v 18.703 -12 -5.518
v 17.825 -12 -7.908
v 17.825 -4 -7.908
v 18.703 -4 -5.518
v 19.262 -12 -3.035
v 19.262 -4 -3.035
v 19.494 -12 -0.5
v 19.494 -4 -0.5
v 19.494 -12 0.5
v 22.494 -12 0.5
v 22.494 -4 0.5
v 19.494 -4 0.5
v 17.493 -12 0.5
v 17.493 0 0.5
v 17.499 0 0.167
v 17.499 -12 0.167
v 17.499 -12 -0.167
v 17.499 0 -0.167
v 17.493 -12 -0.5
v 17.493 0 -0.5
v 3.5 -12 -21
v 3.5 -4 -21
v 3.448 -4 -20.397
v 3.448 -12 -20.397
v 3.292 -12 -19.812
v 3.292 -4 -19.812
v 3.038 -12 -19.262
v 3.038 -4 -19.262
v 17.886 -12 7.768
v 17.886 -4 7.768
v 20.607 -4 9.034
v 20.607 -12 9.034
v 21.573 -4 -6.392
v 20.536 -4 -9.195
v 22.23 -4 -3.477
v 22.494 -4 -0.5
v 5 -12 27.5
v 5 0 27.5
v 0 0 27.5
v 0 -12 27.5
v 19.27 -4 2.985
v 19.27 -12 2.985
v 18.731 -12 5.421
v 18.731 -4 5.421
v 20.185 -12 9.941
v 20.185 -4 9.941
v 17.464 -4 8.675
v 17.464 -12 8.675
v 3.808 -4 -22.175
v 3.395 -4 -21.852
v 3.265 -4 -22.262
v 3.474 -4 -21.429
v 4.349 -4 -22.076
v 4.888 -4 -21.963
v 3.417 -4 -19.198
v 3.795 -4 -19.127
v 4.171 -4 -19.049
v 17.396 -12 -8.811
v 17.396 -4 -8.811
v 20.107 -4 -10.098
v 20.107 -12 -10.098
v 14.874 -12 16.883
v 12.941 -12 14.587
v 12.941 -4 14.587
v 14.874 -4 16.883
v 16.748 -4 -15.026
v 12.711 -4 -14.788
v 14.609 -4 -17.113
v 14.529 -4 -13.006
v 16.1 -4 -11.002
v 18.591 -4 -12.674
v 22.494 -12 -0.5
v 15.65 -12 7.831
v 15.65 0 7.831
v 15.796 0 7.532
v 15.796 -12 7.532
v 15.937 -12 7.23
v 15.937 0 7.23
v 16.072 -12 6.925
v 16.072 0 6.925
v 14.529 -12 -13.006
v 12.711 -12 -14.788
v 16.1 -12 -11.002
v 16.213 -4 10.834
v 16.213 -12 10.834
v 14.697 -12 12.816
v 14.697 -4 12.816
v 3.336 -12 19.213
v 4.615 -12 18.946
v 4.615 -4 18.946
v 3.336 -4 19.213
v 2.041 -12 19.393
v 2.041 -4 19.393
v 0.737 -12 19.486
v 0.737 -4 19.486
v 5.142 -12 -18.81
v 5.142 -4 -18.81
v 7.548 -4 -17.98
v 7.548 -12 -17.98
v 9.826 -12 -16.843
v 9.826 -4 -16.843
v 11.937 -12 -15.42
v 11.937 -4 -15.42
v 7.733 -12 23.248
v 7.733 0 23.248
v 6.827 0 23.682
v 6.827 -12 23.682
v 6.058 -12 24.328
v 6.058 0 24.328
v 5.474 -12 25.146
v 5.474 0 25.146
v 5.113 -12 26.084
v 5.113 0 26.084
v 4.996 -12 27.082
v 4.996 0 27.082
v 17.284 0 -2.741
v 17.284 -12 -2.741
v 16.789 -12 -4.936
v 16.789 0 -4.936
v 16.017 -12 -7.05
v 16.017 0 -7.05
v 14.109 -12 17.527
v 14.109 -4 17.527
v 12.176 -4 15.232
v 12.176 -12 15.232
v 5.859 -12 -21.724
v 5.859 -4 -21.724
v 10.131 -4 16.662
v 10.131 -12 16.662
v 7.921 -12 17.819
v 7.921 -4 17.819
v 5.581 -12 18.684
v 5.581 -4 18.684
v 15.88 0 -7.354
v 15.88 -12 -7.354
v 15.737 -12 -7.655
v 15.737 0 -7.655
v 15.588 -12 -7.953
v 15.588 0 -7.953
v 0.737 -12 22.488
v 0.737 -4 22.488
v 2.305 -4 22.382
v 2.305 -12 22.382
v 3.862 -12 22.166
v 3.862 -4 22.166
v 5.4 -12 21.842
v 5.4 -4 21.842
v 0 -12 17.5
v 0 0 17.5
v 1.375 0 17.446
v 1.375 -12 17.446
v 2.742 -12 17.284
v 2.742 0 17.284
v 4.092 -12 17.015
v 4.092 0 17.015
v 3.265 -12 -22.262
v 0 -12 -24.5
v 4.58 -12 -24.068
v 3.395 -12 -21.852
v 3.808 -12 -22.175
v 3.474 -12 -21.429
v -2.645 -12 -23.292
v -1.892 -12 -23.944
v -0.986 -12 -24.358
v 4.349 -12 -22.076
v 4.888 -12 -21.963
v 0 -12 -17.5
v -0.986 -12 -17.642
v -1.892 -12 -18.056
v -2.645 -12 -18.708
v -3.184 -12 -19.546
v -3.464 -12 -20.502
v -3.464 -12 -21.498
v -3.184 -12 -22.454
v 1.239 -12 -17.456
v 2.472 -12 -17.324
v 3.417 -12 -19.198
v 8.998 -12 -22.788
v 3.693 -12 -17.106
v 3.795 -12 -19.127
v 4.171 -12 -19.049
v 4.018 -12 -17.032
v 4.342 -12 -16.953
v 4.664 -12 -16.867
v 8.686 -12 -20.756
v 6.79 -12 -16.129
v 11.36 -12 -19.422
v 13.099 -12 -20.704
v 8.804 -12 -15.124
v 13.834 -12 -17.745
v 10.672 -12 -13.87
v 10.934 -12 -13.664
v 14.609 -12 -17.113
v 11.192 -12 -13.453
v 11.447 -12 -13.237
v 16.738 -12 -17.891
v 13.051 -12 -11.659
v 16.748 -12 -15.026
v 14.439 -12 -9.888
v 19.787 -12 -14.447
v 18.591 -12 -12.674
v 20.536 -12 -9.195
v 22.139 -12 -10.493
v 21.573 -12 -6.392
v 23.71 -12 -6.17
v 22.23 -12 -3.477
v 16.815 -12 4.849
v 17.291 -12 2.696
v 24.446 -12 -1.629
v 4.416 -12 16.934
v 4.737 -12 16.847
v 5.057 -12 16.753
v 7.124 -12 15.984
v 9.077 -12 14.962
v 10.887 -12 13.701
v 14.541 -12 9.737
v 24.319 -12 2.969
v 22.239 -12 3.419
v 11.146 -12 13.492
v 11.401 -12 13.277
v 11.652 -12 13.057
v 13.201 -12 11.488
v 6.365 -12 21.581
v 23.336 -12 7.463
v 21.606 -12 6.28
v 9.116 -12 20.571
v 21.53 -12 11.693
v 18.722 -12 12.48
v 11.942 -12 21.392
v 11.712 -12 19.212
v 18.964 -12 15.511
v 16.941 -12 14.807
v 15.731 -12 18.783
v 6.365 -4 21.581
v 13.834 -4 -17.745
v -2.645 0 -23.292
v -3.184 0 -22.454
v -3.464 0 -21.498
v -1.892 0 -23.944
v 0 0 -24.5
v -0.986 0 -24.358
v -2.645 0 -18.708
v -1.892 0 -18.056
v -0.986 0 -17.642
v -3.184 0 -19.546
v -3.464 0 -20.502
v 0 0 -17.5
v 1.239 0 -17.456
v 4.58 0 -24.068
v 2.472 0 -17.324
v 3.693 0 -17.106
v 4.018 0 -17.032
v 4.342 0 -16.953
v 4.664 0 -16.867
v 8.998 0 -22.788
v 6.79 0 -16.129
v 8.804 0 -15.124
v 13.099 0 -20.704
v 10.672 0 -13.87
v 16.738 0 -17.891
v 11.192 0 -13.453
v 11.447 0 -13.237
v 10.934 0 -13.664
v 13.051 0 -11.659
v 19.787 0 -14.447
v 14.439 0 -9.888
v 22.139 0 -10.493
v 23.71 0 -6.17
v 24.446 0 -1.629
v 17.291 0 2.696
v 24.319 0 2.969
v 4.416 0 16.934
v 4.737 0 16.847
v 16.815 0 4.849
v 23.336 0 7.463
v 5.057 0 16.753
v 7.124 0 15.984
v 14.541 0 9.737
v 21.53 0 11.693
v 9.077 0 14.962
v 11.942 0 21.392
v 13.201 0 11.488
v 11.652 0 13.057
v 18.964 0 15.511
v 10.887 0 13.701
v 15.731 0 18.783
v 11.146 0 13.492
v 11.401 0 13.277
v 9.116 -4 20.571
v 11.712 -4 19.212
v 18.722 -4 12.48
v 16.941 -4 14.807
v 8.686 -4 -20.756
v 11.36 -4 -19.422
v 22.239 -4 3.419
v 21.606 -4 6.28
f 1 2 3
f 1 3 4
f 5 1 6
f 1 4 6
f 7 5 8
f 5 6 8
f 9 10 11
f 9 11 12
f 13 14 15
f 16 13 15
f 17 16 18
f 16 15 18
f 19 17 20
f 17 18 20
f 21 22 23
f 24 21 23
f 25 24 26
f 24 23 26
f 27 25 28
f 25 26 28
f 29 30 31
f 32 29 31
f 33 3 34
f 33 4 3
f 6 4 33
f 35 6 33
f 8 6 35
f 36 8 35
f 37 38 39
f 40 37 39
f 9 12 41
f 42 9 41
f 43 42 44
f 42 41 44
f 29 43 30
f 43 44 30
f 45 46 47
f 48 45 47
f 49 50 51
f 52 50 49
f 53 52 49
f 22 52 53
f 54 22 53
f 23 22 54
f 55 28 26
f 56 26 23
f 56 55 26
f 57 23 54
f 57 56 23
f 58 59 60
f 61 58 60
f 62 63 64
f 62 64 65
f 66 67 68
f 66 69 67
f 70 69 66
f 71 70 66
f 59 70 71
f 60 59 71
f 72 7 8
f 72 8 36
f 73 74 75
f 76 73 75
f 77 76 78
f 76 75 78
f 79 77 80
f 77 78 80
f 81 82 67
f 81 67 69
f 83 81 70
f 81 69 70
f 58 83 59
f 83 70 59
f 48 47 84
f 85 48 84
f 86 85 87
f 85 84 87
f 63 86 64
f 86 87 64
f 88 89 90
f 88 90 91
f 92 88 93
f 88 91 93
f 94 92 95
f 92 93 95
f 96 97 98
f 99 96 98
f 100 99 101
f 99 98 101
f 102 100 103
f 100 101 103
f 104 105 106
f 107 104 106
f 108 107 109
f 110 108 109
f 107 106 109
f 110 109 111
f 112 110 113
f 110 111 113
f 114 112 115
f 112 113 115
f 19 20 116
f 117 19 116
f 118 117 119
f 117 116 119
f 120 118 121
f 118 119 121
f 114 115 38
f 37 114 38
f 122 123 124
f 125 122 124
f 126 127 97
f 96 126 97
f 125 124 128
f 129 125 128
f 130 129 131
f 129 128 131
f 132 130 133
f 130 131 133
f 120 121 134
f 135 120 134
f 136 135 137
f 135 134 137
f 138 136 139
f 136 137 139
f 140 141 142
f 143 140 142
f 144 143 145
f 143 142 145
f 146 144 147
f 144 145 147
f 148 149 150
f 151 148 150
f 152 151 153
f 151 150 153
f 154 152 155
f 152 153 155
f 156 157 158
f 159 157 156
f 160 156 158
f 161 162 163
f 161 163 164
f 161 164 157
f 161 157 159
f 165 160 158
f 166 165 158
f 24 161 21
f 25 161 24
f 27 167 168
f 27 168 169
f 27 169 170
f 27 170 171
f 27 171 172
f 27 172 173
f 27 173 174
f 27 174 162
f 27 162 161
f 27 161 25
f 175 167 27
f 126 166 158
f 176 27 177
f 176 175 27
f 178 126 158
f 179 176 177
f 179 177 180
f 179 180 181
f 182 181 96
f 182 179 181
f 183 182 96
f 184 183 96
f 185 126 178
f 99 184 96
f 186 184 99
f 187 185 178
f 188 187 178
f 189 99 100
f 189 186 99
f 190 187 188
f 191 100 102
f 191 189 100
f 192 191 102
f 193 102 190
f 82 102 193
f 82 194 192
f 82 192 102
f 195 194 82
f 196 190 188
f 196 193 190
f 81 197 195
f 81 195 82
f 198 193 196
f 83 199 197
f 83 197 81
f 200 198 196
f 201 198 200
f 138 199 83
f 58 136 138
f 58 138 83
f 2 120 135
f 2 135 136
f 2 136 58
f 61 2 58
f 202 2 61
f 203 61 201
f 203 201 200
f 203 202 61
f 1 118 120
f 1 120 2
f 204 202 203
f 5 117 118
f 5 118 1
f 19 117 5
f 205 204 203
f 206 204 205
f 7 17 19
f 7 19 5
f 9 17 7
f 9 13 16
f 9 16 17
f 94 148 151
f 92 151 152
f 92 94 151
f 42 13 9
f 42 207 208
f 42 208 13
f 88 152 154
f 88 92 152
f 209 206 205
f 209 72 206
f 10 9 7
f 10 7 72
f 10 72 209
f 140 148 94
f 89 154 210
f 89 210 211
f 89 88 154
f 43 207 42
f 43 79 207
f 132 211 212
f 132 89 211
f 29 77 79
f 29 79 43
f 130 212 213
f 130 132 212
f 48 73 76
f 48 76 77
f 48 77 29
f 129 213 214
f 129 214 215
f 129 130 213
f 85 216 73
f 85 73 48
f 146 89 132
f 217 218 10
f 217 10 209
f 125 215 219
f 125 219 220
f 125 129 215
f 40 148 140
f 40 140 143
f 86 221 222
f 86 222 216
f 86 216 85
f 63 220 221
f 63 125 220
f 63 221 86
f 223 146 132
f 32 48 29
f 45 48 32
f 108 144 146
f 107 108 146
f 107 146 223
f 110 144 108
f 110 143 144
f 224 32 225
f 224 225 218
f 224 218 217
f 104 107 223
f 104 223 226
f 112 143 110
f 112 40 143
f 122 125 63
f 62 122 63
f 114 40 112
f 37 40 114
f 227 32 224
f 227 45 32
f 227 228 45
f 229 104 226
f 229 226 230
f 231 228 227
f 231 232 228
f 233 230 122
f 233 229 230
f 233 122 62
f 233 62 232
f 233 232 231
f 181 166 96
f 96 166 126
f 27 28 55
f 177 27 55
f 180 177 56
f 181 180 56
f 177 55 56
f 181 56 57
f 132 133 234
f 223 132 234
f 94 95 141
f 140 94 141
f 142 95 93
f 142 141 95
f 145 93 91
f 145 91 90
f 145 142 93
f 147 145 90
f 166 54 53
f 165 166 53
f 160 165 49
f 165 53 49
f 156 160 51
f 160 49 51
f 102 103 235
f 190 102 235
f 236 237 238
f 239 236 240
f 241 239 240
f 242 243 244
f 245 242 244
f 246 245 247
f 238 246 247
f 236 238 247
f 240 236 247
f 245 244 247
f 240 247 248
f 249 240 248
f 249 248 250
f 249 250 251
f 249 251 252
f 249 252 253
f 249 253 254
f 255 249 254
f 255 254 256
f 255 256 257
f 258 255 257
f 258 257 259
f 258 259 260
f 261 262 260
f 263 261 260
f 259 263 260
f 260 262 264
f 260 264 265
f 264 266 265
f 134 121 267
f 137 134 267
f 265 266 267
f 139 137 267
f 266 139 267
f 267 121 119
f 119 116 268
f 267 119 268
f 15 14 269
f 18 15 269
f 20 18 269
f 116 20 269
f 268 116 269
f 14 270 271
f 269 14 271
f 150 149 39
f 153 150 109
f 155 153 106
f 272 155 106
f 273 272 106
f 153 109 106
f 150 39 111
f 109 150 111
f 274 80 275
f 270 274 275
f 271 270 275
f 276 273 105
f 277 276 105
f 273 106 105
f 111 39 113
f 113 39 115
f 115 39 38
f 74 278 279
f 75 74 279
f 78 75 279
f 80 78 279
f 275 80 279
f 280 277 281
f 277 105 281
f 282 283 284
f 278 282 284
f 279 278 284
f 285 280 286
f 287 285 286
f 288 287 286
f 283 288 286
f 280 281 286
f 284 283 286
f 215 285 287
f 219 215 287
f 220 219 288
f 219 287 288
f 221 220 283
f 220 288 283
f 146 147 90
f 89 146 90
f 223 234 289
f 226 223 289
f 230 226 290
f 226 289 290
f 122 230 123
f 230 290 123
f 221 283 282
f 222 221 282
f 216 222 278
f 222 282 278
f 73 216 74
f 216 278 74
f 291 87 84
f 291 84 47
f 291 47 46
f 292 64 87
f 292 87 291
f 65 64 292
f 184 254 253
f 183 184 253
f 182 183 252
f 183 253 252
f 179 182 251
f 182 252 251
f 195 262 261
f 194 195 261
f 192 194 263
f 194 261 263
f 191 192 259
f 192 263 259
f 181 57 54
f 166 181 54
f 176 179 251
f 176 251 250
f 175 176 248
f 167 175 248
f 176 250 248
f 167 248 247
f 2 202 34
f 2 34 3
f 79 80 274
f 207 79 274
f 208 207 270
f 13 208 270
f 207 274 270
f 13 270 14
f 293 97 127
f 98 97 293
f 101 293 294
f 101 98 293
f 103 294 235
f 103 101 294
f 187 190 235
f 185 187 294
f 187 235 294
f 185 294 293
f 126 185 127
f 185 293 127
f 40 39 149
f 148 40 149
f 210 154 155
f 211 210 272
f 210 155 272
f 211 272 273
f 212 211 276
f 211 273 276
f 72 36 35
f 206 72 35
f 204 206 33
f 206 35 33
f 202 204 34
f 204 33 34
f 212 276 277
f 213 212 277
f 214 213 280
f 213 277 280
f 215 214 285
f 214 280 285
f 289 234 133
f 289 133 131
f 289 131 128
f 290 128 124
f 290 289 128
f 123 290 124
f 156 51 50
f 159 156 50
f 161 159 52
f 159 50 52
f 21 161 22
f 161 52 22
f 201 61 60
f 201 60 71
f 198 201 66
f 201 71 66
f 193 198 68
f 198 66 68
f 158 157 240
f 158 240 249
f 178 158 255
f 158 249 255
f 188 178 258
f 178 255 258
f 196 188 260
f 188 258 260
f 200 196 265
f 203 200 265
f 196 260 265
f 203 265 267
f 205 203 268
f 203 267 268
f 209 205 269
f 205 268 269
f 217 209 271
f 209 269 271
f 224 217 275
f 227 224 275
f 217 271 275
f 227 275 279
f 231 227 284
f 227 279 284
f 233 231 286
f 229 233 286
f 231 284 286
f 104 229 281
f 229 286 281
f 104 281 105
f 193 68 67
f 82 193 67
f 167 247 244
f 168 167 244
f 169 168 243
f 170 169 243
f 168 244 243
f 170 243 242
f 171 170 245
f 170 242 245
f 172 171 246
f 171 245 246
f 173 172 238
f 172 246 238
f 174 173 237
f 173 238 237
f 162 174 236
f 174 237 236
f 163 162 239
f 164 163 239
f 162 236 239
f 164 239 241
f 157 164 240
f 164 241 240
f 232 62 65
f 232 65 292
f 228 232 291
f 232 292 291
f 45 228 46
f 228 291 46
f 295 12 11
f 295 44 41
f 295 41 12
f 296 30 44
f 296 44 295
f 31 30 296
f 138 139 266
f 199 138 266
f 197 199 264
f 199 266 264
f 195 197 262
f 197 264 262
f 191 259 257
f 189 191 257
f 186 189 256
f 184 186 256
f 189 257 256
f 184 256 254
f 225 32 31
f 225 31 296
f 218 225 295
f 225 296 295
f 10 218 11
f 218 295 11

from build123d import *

# Parameters (mm, degrees)
F1_DEPTH = 12
F2_DEPTH = 4


with BuildPart() as f1:
    # F0 (on Front) → F1 (new body)
    with BuildSketch(Plane.XZ):
        with BuildLine():
            ThreePointArc((3.2645974288, -22.2619047619), (1.9790570145, -23.8867513459), (0, -24.5))
            ThreePointArc((0, -24.5), (24.1848553106, -3.91698527), (7.7332017966, 23.2475286853))
            ThreePointArc((7.7332017966, 23.2475286853), (5.7402372634, 24.7189229124), (4.9959526272, 27.0817493941))
            Line((4.9959526272, 27.0817493941), (5, 27.5))
            Line((5, 27.5), (0, 27.5))
            Line((0, 27.5), (0, 22.5))
            ThreePointArc((0, 22.5), (0.3684190635, 22.4969835177), (0.7367393421, 22.4879348794))
            ThreePointArc((0.7367393421, 22.4879348794), (3.0854175192, 22.2874448677), (5.4002308519, 21.8423329053))
            ThreePointArc((5.4002308519, 21.8423329053), (5.8842824725, 21.7169339407), (6.3654279159, 21.5808092399))
            ThreePointArc((6.3654279159, 21.5808092399), (10.4359015463, 19.9334382111), (14.1088814913, 17.5268212481))
            Line((14.1088814913, 17.5268212481), (15.390053392, 19.0478849319))
            Line((15.390053392, 19.0478849319), (16.1548961655, 18.4036679406))
            Line((16.1548961655, 18.4036679406), (14.8737242648, 16.8826042569))
            ThreePointArc((14.8737242648, 16.8826042569), (17.8696160512, 13.6721184234), (20.1848709505, 9.940874444))
            Line((20.1848709505, 9.940874444), (21.9880539238, 10.7796636511))
            Line((21.9880539238, 10.7796636511), (22.4098257867, 9.8729616628))
            Line((22.4098257867, 9.8729616628), (20.6066428134, 9.0341724557))
            ThreePointArc((20.6066428134, 9.0341724557), (21.968931262, 4.8596357071), (22.4944437584, 0.5))
            Line((22.4944437584, 0.5), (24.4831710321, 0.5))
            Line((24.4831710321, 0.5), (24.4831710321, -0.5))
            Line((24.4831710321, -0.5), (22.4944437584, -0.5))
            ThreePointArc((22.4944437584, -0.5), (21.9498115027, -4.9452780503), (20.5355495573, -9.1946291051))
            Line((20.5355495573, -9.1946291051), (22.3321351352, -10.0474575933))
            Line((22.3321351352, -10.0474575933), (21.9033038423, -10.9508421859))
            Line((21.9033038423, -10.9508421859), (20.1067182643, -10.0980136977))
            ThreePointArc((20.1067182643, -10.0980136977), (17.708431542, -13.8802540438), (14.6085543834, -17.1125725368))
            Line((14.6085543834, -17.1125725368), (15.8658425706, -18.6534367694))
            Line((15.8658425706, -18.6534367694), (15.0910434049, -19.2856442137))
            Line((15.0910434049, -19.2856442137), (13.8337552177, -17.7447799811))
            ThreePointArc((13.8337552177, -17.7447799811), (10.0452369261, -20.1331372393), (5.8587363435, -21.7238396343))
            Line((5.8587363435, -21.7238396343), (6.3337803191, -23.6549971603))
            Line((6.3337803191, -23.6549971603), (5.3627283546, -23.8938654968))
            Line((5.3627283546, -23.8938654968), (4.887684379, -21.9627079708))
            ThreePointArc((4.887684379, -21.9627079708), (4.0788851845, -22.1271935783), (3.2645974288, -22.2619047619))
        make_face()
        with BuildLine():
            Line((15.390053392, 19.0478849319), (14.1088814913, 17.5268212481))
            ThreePointArc((14.1088814913, 17.5268212481), (14.4948823033, 17.2089624038), (14.8737242648, 16.8826042569))
            Line((14.8737242648, 16.8826042569), (16.1548961655, 18.4036679406))
            Line((16.1548961655, 18.4036679406), (15.390053392, 19.0478849319))
        make_face()
        with BuildLine():
            Line((21.9880539238, 10.7796636511), (20.1848709505, 9.940874444))
            ThreePointArc((20.1848709505, 9.940874444), (20.4007947373, 9.4898669162), (20.6066428134, 9.0341724557))
            Line((20.6066428134, 9.0341724557), (22.4098257867, 9.8729616628))
            Line((22.4098257867, 9.8729616628), (21.9880539238, 10.7796636511))
        make_face()
        with BuildLine():
            ThreePointArc((22.4944437584, 0.5), (22.5, 0), (22.4944437584, -0.5))
            Line((22.4944437584, -0.5), (24.4831710321, -0.5))
            Line((24.4831710321, -0.5), (24.4831710321, 0.5))
            Line((24.4831710321, 0.5), (22.4944437584, 0.5))
        make_face()
        with BuildLine():
            ThreePointArc((20.5355495573, -9.1946291051), (20.3261533338, -9.6487040917), (20.1067182643, -10.0980136977))
            Line((20.1067182643, -10.0980136977), (21.9033038423, -10.9508421859))
            Line((21.9033038423, -10.9508421859), (22.3321351352, -10.0474575933))
            Line((22.3321351352, -10.0474575933), (20.5355495573, -9.1946291051))
        make_face()
        with BuildLine():
            ThreePointArc((14.6085543834, -17.1125725368), (14.2246674978, -17.4329812303), (13.8337552177, -17.7447799811))
            Line((13.8337552177, -17.7447799811), (15.0910434049, -19.2856442137))
            Line((15.0910434049, -19.2856442137), (15.8658425706, -18.6534367694))
            Line((15.8658425706, -18.6534367694), (14.6085543834, -17.1125725368))
        make_face()
        with BuildLine():
            ThreePointArc((5.8587363435, -21.7238396343), (5.3745375714, -21.8486692019), (4.887684379, -21.9627079708))
            Line((4.887684379, -21.9627079708), (5.3627283546, -23.8938654968))
            Line((5.3627283546, -23.8938654968), (6.3337803191, -23.6549971603))
            Line((6.3337803191, -23.6549971603), (5.8587363435, -21.7238396343))
        make_face()
        with BuildLine():
            ThreePointArc((10.6717140038, -13.8695537139), (7.8129620537, -15.6591067417), (4.6640153204, -16.8670377094))
            Line((4.6640153204, -16.8670377094), (5.1419270851, -18.8098534245))
            ThreePointArc((5.1419270851, -18.8098534245), (8.7058720027, -17.4487189408), (11.9365923038, -15.4197199772))
            Line((11.9365923038, -15.4197199772), (10.6717140038, -13.8695537139))
        make_face()
        with BuildLine():
            ThreePointArc((4.6640153204, -16.8670377094), (4.1801958889, -16.9934093792), (3.6929633559, -17.1059060459))
            Line((3.6929633559, -17.1059060459), (4.1708751206, -19.048721761))
            ThreePointArc((4.1708751206, -19.048721761), (4.6579325619, -18.9355133083), (5.1419270851, -18.8098534245))
            Line((5.1419270851, -18.8098534245), (4.6640153204, -16.8670377094))
        make_face()
        with BuildLine():
            ThreePointArc((3.6929633559, -17.1059060459), (1.8569658312, -17.4011975996), (0, -17.5))
            ThreePointArc((0, -17.5), (1.7559422921, -17.9723496459), (3.03793103, -19.2619047619))
            ThreePointArc((3.03793103, -19.2619047619), (3.6059788237, -19.1636874511), (4.1708751206, -19.048721761))
            Line((4.1708751206, -19.048721761), (3.6929633559, -17.1059060459))
        make_face()
        with BuildLine():
            ThreePointArc((0, -17.5), (-3.5, -21), (0, -24.5))
            ThreePointArc((0, -24.5), (1.9790570145, -23.8867513459), (3.2645974288, -22.2619047619))
            ThreePointArc((3.2645974288, -22.2619047619), (3.4406460876, -21.641836817), (3.5, -21))
            ThreePointArc((3.5, -21), (3.3825107986, -20.1007666057), (3.03793103, -19.2619047619))
            ThreePointArc((3.03793103, -19.2619047619), (1.7559422921, -17.9723496459), (0, -17.5))
        make_face()
        with BuildLine():
            ThreePointArc((11.4465131696, -13.2373462695), (11.0636302761, -13.5589854013), (10.6717140038, -13.8695537139))
            Line((10.6717140038, -13.8695537139), (11.9365923038, -15.4197199772))
            ThreePointArc((11.9365923038, -15.4197199772), (12.3280451648, -15.1085837329), (12.7113914695, -14.7875125328))
            Line((12.7113914695, -14.7875125328), (11.4465131696, -13.2373462695))
        make_face()
        with BuildLine():
            Line((4.1708751206, -19.048721761), (4.887684379, -21.9627079708))
            ThreePointArc((4.887684379, -21.9627079708), (5.3745375714, -21.8486692019), (5.8587363435, -21.7238396343))
            Line((5.8587363435, -21.7238396343), (5.1419270851, -18.8098534245))
            ThreePointArc((5.1419270851, -18.8098534245), (4.6579325619, -18.9355133083), (4.1708751206, -19.048721761))
        make_face()
        with BuildLine():
            Line((11.9365923038, -15.4197199772), (13.8337552177, -17.7447799811))
            ThreePointArc((13.8337552177, -17.7447799811), (14.2246674978, -17.4329812303), (14.6085543834, -17.1125725368))
            Line((14.6085543834, -17.1125725368), (12.7113914695, -14.7875125328))
            ThreePointArc((12.7113914695, -14.7875125328), (12.3280451648, -15.1085837329), (11.9365923038, -15.4197199772))
        make_face()
        with BuildLine():
            ThreePointArc((15.5883606598, -7.9531762171), (13.7732245327, -10.7957531452), (11.4465131696, -13.2373462695))
            Line((11.4465131696, -13.2373462695), (12.7113914695, -14.7875125328))
            ThreePointArc((12.7113914695, -14.7875125328), (15.3473073364, -12.0295535047), (17.3957920305, -8.8111531386))
            Line((17.3957920305, -8.8111531386), (15.5883606598, -7.9531762171))
        make_face()
        with BuildLine():
            ThreePointArc((16.0171919527, -7.0497916245), (15.8092303708, -7.5045476269), (15.5883606598, -7.9531762171))
            Line((15.5883606598, -7.9531762171), (17.3957920305, -8.8111531386))
            ThreePointArc((17.3957920305, -8.8111531386), (17.615999556, -8.3622102128), (17.8246233235, -7.907768546))
            Line((17.8246233235, -7.907768546), (16.0171919527, -7.0497916245))
        make_face()
        with BuildLine():
            ThreePointArc((17.4928556845, -0.5), (17.0720756132, -3.8463273724), (16.0171919527, -7.0497916245))
            Line((16.0171919527, -7.0497916245), (17.8246233235, -7.907768546))
            ThreePointArc((17.8246233235, -7.907768546), (19.023169969, -4.2859076436), (19.4935886896, -0.5))
            Line((19.4935886896, -0.5), (17.4928556845, -0.5))
        make_face()
        with BuildLine():
            ThreePointArc((17.4928556845, 0.5), (17.5, 0), (17.4928556845, -0.5))
            Line((17.4928556845, -0.5), (19.4935886896, -0.5))
            ThreePointArc((19.4935886896, -0.5), (19.5, 0), (19.4935886896, 0.5))
            Line((19.4935886896, 0.5), (17.4928556845, 0.5))
        make_face()
        with BuildLine():
            ThreePointArc((16.0716929621, 6.9246433361), (17.0869465371, 3.7797166611), (17.4928556845, 0.5))
            Line((17.4928556845, 0.5), (19.4935886896, 0.5))
            ThreePointArc((19.4935886896, 0.5), (19.0397404271, 4.2116842795), (17.8857615559, 7.7684962229))
            Line((17.8857615559, 7.7684962229), (16.0716929621, 6.9246433361))
        make_face()
        with BuildLine():
            Line((17.3957920305, -8.8111531386), (20.1067182643, -10.0980136977))
            ThreePointArc((20.1067182643, -10.0980136977), (20.3261533338, -9.6487040917), (20.5355495573, -9.1946291051))
            Line((20.5355495573, -9.1946291051), (17.8246233235, -7.907768546))
            ThreePointArc((17.8246233235, -7.907768546), (17.615999556, -8.3622102128), (17.3957920305, -8.8111531386))
        make_face()
        with BuildLine():
            Line((19.4935886896, -0.5), (22.4944437584, -0.5))
            ThreePointArc((22.4944437584, -0.5), (22.5, 0), (22.4944437584, 0.5))
            Line((22.4944437584, 0.5), (19.4935886896, 0.5))
            ThreePointArc((19.4935886896, 0.5), (19.5, 0), (19.4935886896, -0.5))
        make_face()
        with BuildLine():
            Line((17.463989693, 8.6751982112), (15.6499210991, 7.8313453244))
            ThreePointArc((15.6499210991, 7.8313453244), (15.8672847957, 7.3810076015), (16.0716929621, 6.9246433361))
            Line((16.0716929621, 6.9246433361), (17.8857615559, 7.7684962229))
            ThreePointArc((17.8857615559, 7.7684962229), (17.6806887723, 8.2245513274), (17.463989693, 8.6751982112))
        make_face()
        with BuildLine():
            Line((20.1848709505, 9.940874444), (17.463989693, 8.6751982112))
            ThreePointArc((17.463989693, 8.6751982112), (17.6806887723, 8.2245513274), (17.8857615559, 7.7684962229))
            Line((17.8857615559, 7.7684962229), (20.6066428134, 9.0341724557))
            ThreePointArc((20.6066428134, 9.0341724557), (20.4007947373, 9.4898669162), (20.1848709505, 9.940874444))
        make_face()
        with BuildLine():
            Line((12.9405224412, 14.5874219432), (11.6516162443, 13.0571757626))
            ThreePointArc((11.6516162443, 13.0571757626), (13.898590262, 10.6338698849), (15.6499210991, 7.8313453244))
            Line((15.6499210991, 7.8313453244), (17.463989693, 8.6751982112))
            ThreePointArc((17.463989693, 8.6751982112), (15.4870005777, 11.8491693003), (12.9405224412, 14.5874219432))
        make_face()
        with BuildLine():
            Line((12.1756796677, 15.2316389345), (10.8867734708, 13.7013927538))
            ThreePointArc((10.8867734708, 13.7013927538), (11.273797347, 13.3847485363), (11.6516162443, 13.0571757626))
            Line((11.6516162443, 13.0571757626), (12.9405224412, 14.5874219432))
            ThreePointArc((12.9405224412, 14.5874219432), (12.5622313295, 14.9144340833), (12.1756796677, 15.2316389345))
        make_face()
        with BuildLine():
            Line((14.1088814913, 17.5268212481), (12.1756796677, 15.2316389345))
            ThreePointArc((12.1756796677, 15.2316389345), (12.5622313295, 14.9144340833), (12.9405224412, 14.5874219432))
            Line((12.9405224412, 14.5874219432), (14.8737242648, 16.8826042569))
            ThreePointArc((14.8737242648, 16.8826042569), (14.4948823033, 17.2089624038), (14.1088814913, 17.5268212481))
        make_face()
        with BuildLine():
            Line((5.5806332988, 18.6843927379), (5.0573942698, 16.7532911155))
            ThreePointArc((5.0573942698, 16.7532911155), (8.1168123138, 15.5037852753), (10.8867734708, 13.7013927538))
            Line((10.8867734708, 13.7013927538), (12.1756796677, 15.2316389345))
            ThreePointArc((12.1756796677, 15.2316389345), (9.0444480068, 17.2756464496), (5.5806332988, 18.6843927379))
        make_face()
        with BuildLine():
            Line((5.4002308519, 21.8423329053), (4.6154362348, 18.9459164033))
            ThreePointArc((4.6154362348, 18.9459164033), (5.0997114762, 18.8213427486), (5.5806332988, 18.6843927379))
            Line((5.5806332988, 18.6843927379), (6.3654279159, 21.5808092399))
            ThreePointArc((6.3654279159, 21.5808092399), (5.8842824725, 21.7169339407), (5.4002308519, 21.8423329053))
        make_face()
        with BuildLine():
            Line((4.6154362348, 18.9459164033), (4.0921972057, 17.0148147809))
            ThreePointArc((4.0921972057, 17.0148147809), (4.5766641453, 16.8909486205), (5.0573942698, 16.7532911155))
            Line((5.0573942698, 16.7532911155), (5.5806332988, 18.6843927379))
            ThreePointArc((5.5806332988, 18.6843927379), (5.0997114762, 18.8213427486), (4.6154362348, 18.9459164033))
        make_face()
        with BuildLine():
            Line((0, 19.5), (0, 17.5))
            ThreePointArc((0, 17.5), (2.0604297287, 17.3782803906), (4.0921972057, 17.0148147809))
            Line((4.0921972057, 17.0148147809), (4.6154362348, 18.9459164033))
            ThreePointArc((4.6154362348, 18.9459164033), (2.6896820158, 19.3136120561), (0.7367393421, 19.4860774694))
            ThreePointArc((0.7367393421, 19.4860774694), (0.3684354404, 19.4965190566), (0, 19.5))
        make_face()
        with BuildLine():
            Line((0, 22.5), (0, 19.5))
            ThreePointArc((0, 19.5), (0.3684354404, 19.4965190566), (0.7367393421, 19.4860774694))
            Line((0.7367393421, 19.4860774694), (0.7367393421, 22.4879348794))
            ThreePointArc((0.7367393421, 22.4879348794), (0.3684190635, 22.4969835177), (0, 22.5))
        make_face()
    extrude(amount=F1_DEPTH)

    # F0 (on Front) → F2 (join)
    with BuildSketch(Plane.XZ):
        with BuildLine():
            Line((5.1419270851, -18.8098534245), (5.8587363435, -21.7238396343))
            ThreePointArc((5.8587363435, -21.7238396343), (10.0452369261, -20.1331372393), (13.8337552177, -17.7447799811))
            Line((13.8337552177, -17.7447799811), (11.9365923038, -15.4197199772))
            ThreePointArc((11.9365923038, -15.4197199772), (8.7058720027, -17.4487189408), (5.1419270851, -18.8098534245))
        make_face()
        with BuildLine():
            Line((19.4935886896, 0.5), (22.4944437584, 0.5))
            ThreePointArc((22.4944437584, 0.5), (21.968931262, 4.8596357071), (20.6066428134, 9.0341724557))
            Line((20.6066428134, 9.0341724557), (17.8857615559, 7.7684962229))
            ThreePointArc((17.8857615559, 7.7684962229), (19.0397404271, 4.2116842795), (19.4935886896, 0.5))
        make_face()
        with BuildLine():
            Line((14.8737242648, 16.8826042569), (12.9405224412, 14.5874219432))
            ThreePointArc((12.9405224412, 14.5874219432), (15.4870005777, 11.8491693003), (17.463989693, 8.6751982112))
            Line((17.463989693, 8.6751982112), (20.1848709505, 9.940874444))
            ThreePointArc((20.1848709505, 9.940874444), (17.8696160512, 13.6721184234), (14.8737242648, 16.8826042569))
        make_face()
        with BuildLine():
            Line((17.8246233235, -7.907768546), (20.5355495573, -9.1946291051))
            ThreePointArc((20.5355495573, -9.1946291051), (21.9498115027, -4.9452780503), (22.4944437584, -0.5))
            Line((22.4944437584, -0.5), (19.4935886896, -0.5))
            ThreePointArc((19.4935886896, -0.5), (19.023169969, -4.2859076436), (17.8246233235, -7.907768546))
        make_face()
        with BuildLine():
            Line((6.3654279159, 21.5808092399), (5.5806332988, 18.6843927379))
            ThreePointArc((5.5806332988, 18.6843927379), (9.0444480068, 17.2756464496), (12.1756796677, 15.2316389345))
            Line((12.1756796677, 15.2316389345), (14.1088814913, 17.5268212481))
            ThreePointArc((14.1088814913, 17.5268212481), (10.4359015463, 19.9334382111), (6.3654279159, 21.5808092399))
        make_face()
        with BuildLine():
            ThreePointArc((3.5, -21), (3.4406460876, -21.641836817), (3.2645974288, -22.2619047619))
            ThreePointArc((3.2645974288, -22.2619047619), (4.0788851845, -22.1271935783), (4.887684379, -21.9627079708))
            Line((4.887684379, -21.9627079708), (4.1708751206, -19.048721761))
            ThreePointArc((4.1708751206, -19.048721761), (3.6059788237, -19.1636874511), (3.03793103, -19.2619047619))
            ThreePointArc((3.03793103, -19.2619047619), (3.3825107986, -20.1007666057), (3.5, -21))
        make_face()
        with BuildLine():
            Line((12.7113914695, -14.7875125328), (14.6085543834, -17.1125725368))
            ThreePointArc((14.6085543834, -17.1125725368), (17.708431542, -13.8802540438), (20.1067182643, -10.0980136977))
            Line((20.1067182643, -10.0980136977), (17.3957920305, -8.8111531386))
            ThreePointArc((17.3957920305, -8.8111531386), (15.3473073364, -12.0295535047), (12.7113914695, -14.7875125328))
        make_face()
        with BuildLine():
            ThreePointArc((0.7367393421, 19.4860774694), (2.6896820158, 19.3136120561), (4.6154362348, 18.9459164033))
            Line((4.6154362348, 18.9459164033), (5.4002308519, 21.8423329053))
            ThreePointArc((5.4002308519, 21.8423329053), (3.0854175192, 22.2874448677), (0.7367393421, 22.4879348794))
            Line((0.7367393421, 22.4879348794), (0.7367393421, 19.4860774694))
        make_face()
    extrude(amount=F2_DEPTH)


solid = f1.part
